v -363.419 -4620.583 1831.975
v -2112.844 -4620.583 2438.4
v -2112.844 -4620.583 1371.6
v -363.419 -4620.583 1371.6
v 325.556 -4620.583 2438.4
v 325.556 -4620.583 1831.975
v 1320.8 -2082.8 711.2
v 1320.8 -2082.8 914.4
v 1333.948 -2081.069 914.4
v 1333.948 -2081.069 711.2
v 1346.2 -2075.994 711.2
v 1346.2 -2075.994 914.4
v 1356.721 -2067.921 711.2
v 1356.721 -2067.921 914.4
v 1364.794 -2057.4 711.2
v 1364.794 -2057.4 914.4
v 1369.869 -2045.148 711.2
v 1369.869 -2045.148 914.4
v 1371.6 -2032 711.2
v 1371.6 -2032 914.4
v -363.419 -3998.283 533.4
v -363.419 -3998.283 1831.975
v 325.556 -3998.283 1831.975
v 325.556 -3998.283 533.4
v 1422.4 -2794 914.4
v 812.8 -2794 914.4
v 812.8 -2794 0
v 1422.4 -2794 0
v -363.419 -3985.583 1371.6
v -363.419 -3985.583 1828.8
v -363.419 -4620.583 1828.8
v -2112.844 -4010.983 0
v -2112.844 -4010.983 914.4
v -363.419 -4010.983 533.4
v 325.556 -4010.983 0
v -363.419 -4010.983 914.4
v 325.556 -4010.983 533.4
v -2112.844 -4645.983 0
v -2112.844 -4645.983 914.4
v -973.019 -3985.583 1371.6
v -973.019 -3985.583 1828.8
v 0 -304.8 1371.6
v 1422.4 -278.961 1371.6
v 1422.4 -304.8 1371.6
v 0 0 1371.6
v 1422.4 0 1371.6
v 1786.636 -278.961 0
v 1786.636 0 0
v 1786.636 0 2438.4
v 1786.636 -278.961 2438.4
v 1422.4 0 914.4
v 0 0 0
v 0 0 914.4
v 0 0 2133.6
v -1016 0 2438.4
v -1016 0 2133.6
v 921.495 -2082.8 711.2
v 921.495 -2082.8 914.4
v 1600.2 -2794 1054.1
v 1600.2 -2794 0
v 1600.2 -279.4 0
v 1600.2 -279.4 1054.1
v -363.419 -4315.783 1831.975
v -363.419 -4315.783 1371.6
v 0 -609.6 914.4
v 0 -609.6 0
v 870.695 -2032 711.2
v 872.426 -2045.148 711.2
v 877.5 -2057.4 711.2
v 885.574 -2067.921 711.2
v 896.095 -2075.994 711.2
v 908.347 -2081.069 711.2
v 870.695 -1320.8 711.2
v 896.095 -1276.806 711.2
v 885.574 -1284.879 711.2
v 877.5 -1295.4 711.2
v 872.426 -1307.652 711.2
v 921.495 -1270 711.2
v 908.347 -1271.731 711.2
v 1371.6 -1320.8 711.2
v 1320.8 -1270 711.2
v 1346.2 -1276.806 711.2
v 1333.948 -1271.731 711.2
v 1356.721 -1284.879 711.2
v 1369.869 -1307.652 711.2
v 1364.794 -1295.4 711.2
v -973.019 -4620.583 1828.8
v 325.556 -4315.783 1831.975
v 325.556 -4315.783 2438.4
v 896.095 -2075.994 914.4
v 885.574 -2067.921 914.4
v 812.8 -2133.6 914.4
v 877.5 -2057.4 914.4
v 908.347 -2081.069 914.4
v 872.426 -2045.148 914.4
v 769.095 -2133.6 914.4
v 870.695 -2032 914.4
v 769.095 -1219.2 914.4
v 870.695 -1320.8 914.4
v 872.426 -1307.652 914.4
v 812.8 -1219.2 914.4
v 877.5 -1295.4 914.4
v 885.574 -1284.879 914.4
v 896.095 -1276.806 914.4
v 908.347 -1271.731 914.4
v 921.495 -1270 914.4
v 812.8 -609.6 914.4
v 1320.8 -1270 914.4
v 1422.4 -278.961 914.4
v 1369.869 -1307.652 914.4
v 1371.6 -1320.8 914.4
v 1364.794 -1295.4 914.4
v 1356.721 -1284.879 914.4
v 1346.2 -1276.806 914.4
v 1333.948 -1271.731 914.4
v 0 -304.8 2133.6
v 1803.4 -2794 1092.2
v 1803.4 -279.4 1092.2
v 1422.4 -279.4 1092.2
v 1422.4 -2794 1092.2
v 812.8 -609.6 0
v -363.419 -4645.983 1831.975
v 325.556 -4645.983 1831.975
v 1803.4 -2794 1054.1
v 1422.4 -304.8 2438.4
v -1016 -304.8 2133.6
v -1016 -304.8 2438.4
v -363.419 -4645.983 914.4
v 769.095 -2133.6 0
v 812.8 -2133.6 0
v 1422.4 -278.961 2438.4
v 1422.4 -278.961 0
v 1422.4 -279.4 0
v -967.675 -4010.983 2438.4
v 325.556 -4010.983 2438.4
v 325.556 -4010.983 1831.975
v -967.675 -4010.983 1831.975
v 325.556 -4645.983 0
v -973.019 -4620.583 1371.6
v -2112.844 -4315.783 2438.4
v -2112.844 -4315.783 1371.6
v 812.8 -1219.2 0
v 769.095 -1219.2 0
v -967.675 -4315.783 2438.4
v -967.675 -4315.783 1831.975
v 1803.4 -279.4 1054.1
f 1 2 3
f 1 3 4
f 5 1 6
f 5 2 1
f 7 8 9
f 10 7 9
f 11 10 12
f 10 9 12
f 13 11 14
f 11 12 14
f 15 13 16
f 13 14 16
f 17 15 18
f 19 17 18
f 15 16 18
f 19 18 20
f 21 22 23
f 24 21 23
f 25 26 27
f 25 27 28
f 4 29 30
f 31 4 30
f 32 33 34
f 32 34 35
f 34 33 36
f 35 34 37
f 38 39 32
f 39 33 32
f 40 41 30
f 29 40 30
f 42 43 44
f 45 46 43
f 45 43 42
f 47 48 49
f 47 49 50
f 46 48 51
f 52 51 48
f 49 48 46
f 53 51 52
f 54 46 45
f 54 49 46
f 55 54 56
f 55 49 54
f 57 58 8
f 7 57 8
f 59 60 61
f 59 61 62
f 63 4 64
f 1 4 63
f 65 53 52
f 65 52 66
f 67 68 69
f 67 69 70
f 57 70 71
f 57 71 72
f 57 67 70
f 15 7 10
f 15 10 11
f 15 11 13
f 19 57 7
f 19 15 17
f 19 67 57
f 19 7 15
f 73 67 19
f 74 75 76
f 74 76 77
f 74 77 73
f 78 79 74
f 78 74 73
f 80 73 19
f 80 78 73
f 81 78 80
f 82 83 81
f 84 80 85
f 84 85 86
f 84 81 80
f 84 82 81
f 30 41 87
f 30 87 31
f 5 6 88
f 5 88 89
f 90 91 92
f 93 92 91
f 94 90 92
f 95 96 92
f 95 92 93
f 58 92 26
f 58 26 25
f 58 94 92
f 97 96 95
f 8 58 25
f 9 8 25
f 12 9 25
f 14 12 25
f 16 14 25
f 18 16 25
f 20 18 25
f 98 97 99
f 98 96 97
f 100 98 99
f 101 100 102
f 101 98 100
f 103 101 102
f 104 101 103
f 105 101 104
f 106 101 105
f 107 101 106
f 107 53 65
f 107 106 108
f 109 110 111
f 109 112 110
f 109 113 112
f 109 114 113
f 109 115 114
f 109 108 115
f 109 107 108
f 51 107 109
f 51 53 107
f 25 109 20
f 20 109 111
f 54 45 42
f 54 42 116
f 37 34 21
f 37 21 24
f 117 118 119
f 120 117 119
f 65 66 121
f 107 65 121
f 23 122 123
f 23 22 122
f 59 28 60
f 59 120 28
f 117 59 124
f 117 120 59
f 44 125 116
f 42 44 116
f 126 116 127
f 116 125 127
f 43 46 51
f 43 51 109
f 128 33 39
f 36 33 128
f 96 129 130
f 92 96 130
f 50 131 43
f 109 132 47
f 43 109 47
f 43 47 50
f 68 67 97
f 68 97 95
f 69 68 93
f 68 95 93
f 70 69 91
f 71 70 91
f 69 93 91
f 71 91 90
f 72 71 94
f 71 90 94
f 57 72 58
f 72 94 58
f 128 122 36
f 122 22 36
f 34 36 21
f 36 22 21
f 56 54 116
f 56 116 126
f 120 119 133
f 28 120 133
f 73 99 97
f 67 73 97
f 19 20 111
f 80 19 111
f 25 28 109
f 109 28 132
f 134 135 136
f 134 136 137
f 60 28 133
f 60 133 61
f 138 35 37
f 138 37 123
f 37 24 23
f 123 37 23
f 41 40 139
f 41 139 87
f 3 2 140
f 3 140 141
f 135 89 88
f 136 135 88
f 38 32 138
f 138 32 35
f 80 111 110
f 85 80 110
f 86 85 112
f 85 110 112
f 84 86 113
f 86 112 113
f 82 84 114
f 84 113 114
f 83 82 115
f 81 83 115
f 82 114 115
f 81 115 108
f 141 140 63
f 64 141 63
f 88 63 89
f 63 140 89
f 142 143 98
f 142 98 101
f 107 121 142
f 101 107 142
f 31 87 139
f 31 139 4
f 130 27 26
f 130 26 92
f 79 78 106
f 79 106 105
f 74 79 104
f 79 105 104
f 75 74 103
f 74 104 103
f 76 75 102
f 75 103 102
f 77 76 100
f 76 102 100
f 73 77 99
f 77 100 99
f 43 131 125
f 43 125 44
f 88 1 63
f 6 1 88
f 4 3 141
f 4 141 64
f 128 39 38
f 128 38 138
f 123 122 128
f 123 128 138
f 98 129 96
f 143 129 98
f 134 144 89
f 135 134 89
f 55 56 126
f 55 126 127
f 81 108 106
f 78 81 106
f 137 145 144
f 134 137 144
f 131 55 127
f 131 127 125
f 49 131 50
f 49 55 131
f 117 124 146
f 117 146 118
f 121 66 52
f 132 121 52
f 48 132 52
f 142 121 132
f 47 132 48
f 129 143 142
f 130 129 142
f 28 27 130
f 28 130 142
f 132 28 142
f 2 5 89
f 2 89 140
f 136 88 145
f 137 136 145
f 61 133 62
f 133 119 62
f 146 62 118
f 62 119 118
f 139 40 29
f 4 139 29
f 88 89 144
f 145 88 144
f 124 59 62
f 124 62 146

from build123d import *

# Parameters (mm, degrees)
F0_W      = 609.6
F0_H      = 609.6
F0_H_2    = 914.4
F0_W_2    = 43.7054136276
F0_H_3    = 660.4
F1_DEPTH  = 914.4
F2_W      = 203.2
F2_H      = 38.1
F3_DEPTH  = 2514.6
F4_W      = 364.2358757019
F4_H      = 278.9609730244
F5_DEPTH  = 2438.4
F7_DEPTH  = 203.2
F8_W      = 2438.4
F8_H      = 609.6
F9_DEPTH  = 914.4
F10_W     = 1016
F10_H     = 304.8
F11_DEPTH = 304.8
F12_W     = 688.975
F12_H     = 917.575
F12_H_2   = 381
F13_DEPTH = 622.3
F14_W     = 688.975
F14_H     = 606.425
F15_DEPTH = 304.8
F16_W     = 609.6
F16_H     = 457.2
F17_DEPTH = 635
F19_DEPTH = 304.8
F20_DEPTH = 25.4


with BuildPart() as f1:
    # F0 (on Top) → F1 (new body)
    with BuildSketch(Plane.XY):
        Polygon((1422.4, 0), (0, 0), (0, -609.6), (812.8, -609.6), (1422.4, -609.6), align=None)
        with Locations((1117.6, -914.4)):
            Rectangle(F0_W, F0_H)
        with Locations((1117.6, -1676.4)):
            Rectangle(F0_W, F0_H_2)
        with Locations((790.9472931862, -1676.4)):
            Rectangle(F0_W_2, F0_H_2)
        with Locations((1117.6, -2463.8)):
            Rectangle(F0_W, F0_H_3)
    extrude(amount=F1_DEPTH)

    # F4 (on face) → F5 (join)
    with BuildSketch(Plane(origin=(0, 0, 0), x_dir=(1, 0, 0), z_dir=(0, 0, -1))):
        with Locations((1604.517937851, 139.4804865122)):
            Rectangle(F4_W, F4_H)
    extrude(amount=-F5_DEPTH)

    # F6 (on face) → F7 (cut)
    with BuildSketch(Plane.XY.offset(914.4)):
        with BuildLine():
            Line((1320.8, -1270), (921.4945863724, -1270))
            ThreePointArc((921.4945863724, -1270), (885.5735618881, -1284.8789755157), (870.6945863724, -1320.8))
            Line((870.6945863724, -1320.8), (870.6945863724, -2032))
            ThreePointArc((870.6945863724, -2032), (885.5735618881, -2067.9210244843), (921.4945863724, -2082.8))
            Line((921.4945863724, -2082.8), (1320.8, -2082.8))
            ThreePointArc((1320.8, -2082.8), (1356.7210244843, -2067.9210244843), (1371.6, -2032))
            Line((1371.6, -2032), (1371.6, -1320.8))
            ThreePointArc((1371.6, -1320.8), (1356.7210244843, -1284.8789755157), (1320.8, -1270))
        make_face()
    extrude(amount=-F7_DEPTH, mode=Mode.SUBTRACT)

    # F10 (on face) → F11 (join)
    with BuildSketch(Plane(origin=(0, 0, 0), x_dir=(-1, 0, 0), z_dir=(0, 1, 0))):
        Polygon((-1422.4, 2438.4), (-1422.4, 1371.6), (0, 1371.6), (0, 2133.6), (0, 2438.4), align=None)
        with Locations((508, 2286)):
            Rectangle(F10_W, F10_H)
    extrude(amount=-F11_DEPTH)


with BuildPart() as f3:
    # F2 (on face) → F3 (new body)
    with BuildSketch(Plane.XZ.offset(2794)):
        Polygon((1422.4, 914.4), (1422.4, 0), (1600.2, 0), (1600.2, 1054.1), (1600.2, 1092.2), (1422.4, 1092.2), align=None)
        with Locations((1701.8, 1073.15)):
            Rectangle(F2_W, F2_H)
    extrude(amount=-F3_DEPTH)


with BuildPart() as f9:
    # F8 (on face) → F9 (new body)
    with BuildSketch(Plane.XY.offset(914.4)):
        with Locations((-893.644452095, -4315.7834364895)):
            Rectangle(F8_W, F8_H)
    extrude(amount=-F9_DEPTH)

    # F12 (on face) → F13 (join)
    with BuildSketch(Plane.XZ.offset(4620.5834364895)):
        with Locations((-18.931952095, 1373.1875)):
            Rectangle(F12_W, F12_H)
        with Locations((-18.931952095, 723.9)):
            Rectangle(F12_W, F12_H_2)
    extrude(amount=-F13_DEPTH)

    # F20 (add): a face of the model
    f20_faces = [f9.faces().sort_by_distance(p)[0] for p in [
        (-700.4199903624, -4620.5834364895, 659.5421314332),
    ]]
    extrude(f20_faces, amount=F20_DEPTH)


with BuildPart() as f15:
    # F14 (on face) → F15 (new body)
    with BuildSketch(Plane.XZ.offset(4620.5834364895)):
        Polygon((-363.419452095, 1371.6), (-363.419452095, 1831.975), (-363.419452095, 2438.4), (-2112.844452095, 2438.4), (-2112.844452095, 1371.6), align=None)
        with Locations((-18.931952095, 2135.1875)):
            Rectangle(F14_W, F14_H)
    extrude(amount=-F15_DEPTH)


with BuildPart() as f17:
    # F16 (on face) → F17 (new body)
    with BuildSketch(Plane.XZ.offset(4620.5834364895)):
        with Locations((-668.219452095, 1600.2)):
            Rectangle(F16_W, F16_H)
    extrude(amount=-F17_DEPTH)


with BuildPart() as f19:
    # F18 (on face) → F19 (new body)
    with BuildSketch(Plane(origin=(0, -4315.7834364895, 0), x_dir=(-1, 0, 0), z_dir=(0, 1, 0))):
        Polygon((-325.555547905, 2438.4), (-325.555547905, 1831.975), (363.419452095, 1831.975), (967.6747918129, 1831.975), (967.6747918129, 2438.4), align=None)
    extrude(amount=F19_DEPTH)


solid = Compound([f1.part, f3.part, f9.part, f15.part, f17.part, f19.part])
